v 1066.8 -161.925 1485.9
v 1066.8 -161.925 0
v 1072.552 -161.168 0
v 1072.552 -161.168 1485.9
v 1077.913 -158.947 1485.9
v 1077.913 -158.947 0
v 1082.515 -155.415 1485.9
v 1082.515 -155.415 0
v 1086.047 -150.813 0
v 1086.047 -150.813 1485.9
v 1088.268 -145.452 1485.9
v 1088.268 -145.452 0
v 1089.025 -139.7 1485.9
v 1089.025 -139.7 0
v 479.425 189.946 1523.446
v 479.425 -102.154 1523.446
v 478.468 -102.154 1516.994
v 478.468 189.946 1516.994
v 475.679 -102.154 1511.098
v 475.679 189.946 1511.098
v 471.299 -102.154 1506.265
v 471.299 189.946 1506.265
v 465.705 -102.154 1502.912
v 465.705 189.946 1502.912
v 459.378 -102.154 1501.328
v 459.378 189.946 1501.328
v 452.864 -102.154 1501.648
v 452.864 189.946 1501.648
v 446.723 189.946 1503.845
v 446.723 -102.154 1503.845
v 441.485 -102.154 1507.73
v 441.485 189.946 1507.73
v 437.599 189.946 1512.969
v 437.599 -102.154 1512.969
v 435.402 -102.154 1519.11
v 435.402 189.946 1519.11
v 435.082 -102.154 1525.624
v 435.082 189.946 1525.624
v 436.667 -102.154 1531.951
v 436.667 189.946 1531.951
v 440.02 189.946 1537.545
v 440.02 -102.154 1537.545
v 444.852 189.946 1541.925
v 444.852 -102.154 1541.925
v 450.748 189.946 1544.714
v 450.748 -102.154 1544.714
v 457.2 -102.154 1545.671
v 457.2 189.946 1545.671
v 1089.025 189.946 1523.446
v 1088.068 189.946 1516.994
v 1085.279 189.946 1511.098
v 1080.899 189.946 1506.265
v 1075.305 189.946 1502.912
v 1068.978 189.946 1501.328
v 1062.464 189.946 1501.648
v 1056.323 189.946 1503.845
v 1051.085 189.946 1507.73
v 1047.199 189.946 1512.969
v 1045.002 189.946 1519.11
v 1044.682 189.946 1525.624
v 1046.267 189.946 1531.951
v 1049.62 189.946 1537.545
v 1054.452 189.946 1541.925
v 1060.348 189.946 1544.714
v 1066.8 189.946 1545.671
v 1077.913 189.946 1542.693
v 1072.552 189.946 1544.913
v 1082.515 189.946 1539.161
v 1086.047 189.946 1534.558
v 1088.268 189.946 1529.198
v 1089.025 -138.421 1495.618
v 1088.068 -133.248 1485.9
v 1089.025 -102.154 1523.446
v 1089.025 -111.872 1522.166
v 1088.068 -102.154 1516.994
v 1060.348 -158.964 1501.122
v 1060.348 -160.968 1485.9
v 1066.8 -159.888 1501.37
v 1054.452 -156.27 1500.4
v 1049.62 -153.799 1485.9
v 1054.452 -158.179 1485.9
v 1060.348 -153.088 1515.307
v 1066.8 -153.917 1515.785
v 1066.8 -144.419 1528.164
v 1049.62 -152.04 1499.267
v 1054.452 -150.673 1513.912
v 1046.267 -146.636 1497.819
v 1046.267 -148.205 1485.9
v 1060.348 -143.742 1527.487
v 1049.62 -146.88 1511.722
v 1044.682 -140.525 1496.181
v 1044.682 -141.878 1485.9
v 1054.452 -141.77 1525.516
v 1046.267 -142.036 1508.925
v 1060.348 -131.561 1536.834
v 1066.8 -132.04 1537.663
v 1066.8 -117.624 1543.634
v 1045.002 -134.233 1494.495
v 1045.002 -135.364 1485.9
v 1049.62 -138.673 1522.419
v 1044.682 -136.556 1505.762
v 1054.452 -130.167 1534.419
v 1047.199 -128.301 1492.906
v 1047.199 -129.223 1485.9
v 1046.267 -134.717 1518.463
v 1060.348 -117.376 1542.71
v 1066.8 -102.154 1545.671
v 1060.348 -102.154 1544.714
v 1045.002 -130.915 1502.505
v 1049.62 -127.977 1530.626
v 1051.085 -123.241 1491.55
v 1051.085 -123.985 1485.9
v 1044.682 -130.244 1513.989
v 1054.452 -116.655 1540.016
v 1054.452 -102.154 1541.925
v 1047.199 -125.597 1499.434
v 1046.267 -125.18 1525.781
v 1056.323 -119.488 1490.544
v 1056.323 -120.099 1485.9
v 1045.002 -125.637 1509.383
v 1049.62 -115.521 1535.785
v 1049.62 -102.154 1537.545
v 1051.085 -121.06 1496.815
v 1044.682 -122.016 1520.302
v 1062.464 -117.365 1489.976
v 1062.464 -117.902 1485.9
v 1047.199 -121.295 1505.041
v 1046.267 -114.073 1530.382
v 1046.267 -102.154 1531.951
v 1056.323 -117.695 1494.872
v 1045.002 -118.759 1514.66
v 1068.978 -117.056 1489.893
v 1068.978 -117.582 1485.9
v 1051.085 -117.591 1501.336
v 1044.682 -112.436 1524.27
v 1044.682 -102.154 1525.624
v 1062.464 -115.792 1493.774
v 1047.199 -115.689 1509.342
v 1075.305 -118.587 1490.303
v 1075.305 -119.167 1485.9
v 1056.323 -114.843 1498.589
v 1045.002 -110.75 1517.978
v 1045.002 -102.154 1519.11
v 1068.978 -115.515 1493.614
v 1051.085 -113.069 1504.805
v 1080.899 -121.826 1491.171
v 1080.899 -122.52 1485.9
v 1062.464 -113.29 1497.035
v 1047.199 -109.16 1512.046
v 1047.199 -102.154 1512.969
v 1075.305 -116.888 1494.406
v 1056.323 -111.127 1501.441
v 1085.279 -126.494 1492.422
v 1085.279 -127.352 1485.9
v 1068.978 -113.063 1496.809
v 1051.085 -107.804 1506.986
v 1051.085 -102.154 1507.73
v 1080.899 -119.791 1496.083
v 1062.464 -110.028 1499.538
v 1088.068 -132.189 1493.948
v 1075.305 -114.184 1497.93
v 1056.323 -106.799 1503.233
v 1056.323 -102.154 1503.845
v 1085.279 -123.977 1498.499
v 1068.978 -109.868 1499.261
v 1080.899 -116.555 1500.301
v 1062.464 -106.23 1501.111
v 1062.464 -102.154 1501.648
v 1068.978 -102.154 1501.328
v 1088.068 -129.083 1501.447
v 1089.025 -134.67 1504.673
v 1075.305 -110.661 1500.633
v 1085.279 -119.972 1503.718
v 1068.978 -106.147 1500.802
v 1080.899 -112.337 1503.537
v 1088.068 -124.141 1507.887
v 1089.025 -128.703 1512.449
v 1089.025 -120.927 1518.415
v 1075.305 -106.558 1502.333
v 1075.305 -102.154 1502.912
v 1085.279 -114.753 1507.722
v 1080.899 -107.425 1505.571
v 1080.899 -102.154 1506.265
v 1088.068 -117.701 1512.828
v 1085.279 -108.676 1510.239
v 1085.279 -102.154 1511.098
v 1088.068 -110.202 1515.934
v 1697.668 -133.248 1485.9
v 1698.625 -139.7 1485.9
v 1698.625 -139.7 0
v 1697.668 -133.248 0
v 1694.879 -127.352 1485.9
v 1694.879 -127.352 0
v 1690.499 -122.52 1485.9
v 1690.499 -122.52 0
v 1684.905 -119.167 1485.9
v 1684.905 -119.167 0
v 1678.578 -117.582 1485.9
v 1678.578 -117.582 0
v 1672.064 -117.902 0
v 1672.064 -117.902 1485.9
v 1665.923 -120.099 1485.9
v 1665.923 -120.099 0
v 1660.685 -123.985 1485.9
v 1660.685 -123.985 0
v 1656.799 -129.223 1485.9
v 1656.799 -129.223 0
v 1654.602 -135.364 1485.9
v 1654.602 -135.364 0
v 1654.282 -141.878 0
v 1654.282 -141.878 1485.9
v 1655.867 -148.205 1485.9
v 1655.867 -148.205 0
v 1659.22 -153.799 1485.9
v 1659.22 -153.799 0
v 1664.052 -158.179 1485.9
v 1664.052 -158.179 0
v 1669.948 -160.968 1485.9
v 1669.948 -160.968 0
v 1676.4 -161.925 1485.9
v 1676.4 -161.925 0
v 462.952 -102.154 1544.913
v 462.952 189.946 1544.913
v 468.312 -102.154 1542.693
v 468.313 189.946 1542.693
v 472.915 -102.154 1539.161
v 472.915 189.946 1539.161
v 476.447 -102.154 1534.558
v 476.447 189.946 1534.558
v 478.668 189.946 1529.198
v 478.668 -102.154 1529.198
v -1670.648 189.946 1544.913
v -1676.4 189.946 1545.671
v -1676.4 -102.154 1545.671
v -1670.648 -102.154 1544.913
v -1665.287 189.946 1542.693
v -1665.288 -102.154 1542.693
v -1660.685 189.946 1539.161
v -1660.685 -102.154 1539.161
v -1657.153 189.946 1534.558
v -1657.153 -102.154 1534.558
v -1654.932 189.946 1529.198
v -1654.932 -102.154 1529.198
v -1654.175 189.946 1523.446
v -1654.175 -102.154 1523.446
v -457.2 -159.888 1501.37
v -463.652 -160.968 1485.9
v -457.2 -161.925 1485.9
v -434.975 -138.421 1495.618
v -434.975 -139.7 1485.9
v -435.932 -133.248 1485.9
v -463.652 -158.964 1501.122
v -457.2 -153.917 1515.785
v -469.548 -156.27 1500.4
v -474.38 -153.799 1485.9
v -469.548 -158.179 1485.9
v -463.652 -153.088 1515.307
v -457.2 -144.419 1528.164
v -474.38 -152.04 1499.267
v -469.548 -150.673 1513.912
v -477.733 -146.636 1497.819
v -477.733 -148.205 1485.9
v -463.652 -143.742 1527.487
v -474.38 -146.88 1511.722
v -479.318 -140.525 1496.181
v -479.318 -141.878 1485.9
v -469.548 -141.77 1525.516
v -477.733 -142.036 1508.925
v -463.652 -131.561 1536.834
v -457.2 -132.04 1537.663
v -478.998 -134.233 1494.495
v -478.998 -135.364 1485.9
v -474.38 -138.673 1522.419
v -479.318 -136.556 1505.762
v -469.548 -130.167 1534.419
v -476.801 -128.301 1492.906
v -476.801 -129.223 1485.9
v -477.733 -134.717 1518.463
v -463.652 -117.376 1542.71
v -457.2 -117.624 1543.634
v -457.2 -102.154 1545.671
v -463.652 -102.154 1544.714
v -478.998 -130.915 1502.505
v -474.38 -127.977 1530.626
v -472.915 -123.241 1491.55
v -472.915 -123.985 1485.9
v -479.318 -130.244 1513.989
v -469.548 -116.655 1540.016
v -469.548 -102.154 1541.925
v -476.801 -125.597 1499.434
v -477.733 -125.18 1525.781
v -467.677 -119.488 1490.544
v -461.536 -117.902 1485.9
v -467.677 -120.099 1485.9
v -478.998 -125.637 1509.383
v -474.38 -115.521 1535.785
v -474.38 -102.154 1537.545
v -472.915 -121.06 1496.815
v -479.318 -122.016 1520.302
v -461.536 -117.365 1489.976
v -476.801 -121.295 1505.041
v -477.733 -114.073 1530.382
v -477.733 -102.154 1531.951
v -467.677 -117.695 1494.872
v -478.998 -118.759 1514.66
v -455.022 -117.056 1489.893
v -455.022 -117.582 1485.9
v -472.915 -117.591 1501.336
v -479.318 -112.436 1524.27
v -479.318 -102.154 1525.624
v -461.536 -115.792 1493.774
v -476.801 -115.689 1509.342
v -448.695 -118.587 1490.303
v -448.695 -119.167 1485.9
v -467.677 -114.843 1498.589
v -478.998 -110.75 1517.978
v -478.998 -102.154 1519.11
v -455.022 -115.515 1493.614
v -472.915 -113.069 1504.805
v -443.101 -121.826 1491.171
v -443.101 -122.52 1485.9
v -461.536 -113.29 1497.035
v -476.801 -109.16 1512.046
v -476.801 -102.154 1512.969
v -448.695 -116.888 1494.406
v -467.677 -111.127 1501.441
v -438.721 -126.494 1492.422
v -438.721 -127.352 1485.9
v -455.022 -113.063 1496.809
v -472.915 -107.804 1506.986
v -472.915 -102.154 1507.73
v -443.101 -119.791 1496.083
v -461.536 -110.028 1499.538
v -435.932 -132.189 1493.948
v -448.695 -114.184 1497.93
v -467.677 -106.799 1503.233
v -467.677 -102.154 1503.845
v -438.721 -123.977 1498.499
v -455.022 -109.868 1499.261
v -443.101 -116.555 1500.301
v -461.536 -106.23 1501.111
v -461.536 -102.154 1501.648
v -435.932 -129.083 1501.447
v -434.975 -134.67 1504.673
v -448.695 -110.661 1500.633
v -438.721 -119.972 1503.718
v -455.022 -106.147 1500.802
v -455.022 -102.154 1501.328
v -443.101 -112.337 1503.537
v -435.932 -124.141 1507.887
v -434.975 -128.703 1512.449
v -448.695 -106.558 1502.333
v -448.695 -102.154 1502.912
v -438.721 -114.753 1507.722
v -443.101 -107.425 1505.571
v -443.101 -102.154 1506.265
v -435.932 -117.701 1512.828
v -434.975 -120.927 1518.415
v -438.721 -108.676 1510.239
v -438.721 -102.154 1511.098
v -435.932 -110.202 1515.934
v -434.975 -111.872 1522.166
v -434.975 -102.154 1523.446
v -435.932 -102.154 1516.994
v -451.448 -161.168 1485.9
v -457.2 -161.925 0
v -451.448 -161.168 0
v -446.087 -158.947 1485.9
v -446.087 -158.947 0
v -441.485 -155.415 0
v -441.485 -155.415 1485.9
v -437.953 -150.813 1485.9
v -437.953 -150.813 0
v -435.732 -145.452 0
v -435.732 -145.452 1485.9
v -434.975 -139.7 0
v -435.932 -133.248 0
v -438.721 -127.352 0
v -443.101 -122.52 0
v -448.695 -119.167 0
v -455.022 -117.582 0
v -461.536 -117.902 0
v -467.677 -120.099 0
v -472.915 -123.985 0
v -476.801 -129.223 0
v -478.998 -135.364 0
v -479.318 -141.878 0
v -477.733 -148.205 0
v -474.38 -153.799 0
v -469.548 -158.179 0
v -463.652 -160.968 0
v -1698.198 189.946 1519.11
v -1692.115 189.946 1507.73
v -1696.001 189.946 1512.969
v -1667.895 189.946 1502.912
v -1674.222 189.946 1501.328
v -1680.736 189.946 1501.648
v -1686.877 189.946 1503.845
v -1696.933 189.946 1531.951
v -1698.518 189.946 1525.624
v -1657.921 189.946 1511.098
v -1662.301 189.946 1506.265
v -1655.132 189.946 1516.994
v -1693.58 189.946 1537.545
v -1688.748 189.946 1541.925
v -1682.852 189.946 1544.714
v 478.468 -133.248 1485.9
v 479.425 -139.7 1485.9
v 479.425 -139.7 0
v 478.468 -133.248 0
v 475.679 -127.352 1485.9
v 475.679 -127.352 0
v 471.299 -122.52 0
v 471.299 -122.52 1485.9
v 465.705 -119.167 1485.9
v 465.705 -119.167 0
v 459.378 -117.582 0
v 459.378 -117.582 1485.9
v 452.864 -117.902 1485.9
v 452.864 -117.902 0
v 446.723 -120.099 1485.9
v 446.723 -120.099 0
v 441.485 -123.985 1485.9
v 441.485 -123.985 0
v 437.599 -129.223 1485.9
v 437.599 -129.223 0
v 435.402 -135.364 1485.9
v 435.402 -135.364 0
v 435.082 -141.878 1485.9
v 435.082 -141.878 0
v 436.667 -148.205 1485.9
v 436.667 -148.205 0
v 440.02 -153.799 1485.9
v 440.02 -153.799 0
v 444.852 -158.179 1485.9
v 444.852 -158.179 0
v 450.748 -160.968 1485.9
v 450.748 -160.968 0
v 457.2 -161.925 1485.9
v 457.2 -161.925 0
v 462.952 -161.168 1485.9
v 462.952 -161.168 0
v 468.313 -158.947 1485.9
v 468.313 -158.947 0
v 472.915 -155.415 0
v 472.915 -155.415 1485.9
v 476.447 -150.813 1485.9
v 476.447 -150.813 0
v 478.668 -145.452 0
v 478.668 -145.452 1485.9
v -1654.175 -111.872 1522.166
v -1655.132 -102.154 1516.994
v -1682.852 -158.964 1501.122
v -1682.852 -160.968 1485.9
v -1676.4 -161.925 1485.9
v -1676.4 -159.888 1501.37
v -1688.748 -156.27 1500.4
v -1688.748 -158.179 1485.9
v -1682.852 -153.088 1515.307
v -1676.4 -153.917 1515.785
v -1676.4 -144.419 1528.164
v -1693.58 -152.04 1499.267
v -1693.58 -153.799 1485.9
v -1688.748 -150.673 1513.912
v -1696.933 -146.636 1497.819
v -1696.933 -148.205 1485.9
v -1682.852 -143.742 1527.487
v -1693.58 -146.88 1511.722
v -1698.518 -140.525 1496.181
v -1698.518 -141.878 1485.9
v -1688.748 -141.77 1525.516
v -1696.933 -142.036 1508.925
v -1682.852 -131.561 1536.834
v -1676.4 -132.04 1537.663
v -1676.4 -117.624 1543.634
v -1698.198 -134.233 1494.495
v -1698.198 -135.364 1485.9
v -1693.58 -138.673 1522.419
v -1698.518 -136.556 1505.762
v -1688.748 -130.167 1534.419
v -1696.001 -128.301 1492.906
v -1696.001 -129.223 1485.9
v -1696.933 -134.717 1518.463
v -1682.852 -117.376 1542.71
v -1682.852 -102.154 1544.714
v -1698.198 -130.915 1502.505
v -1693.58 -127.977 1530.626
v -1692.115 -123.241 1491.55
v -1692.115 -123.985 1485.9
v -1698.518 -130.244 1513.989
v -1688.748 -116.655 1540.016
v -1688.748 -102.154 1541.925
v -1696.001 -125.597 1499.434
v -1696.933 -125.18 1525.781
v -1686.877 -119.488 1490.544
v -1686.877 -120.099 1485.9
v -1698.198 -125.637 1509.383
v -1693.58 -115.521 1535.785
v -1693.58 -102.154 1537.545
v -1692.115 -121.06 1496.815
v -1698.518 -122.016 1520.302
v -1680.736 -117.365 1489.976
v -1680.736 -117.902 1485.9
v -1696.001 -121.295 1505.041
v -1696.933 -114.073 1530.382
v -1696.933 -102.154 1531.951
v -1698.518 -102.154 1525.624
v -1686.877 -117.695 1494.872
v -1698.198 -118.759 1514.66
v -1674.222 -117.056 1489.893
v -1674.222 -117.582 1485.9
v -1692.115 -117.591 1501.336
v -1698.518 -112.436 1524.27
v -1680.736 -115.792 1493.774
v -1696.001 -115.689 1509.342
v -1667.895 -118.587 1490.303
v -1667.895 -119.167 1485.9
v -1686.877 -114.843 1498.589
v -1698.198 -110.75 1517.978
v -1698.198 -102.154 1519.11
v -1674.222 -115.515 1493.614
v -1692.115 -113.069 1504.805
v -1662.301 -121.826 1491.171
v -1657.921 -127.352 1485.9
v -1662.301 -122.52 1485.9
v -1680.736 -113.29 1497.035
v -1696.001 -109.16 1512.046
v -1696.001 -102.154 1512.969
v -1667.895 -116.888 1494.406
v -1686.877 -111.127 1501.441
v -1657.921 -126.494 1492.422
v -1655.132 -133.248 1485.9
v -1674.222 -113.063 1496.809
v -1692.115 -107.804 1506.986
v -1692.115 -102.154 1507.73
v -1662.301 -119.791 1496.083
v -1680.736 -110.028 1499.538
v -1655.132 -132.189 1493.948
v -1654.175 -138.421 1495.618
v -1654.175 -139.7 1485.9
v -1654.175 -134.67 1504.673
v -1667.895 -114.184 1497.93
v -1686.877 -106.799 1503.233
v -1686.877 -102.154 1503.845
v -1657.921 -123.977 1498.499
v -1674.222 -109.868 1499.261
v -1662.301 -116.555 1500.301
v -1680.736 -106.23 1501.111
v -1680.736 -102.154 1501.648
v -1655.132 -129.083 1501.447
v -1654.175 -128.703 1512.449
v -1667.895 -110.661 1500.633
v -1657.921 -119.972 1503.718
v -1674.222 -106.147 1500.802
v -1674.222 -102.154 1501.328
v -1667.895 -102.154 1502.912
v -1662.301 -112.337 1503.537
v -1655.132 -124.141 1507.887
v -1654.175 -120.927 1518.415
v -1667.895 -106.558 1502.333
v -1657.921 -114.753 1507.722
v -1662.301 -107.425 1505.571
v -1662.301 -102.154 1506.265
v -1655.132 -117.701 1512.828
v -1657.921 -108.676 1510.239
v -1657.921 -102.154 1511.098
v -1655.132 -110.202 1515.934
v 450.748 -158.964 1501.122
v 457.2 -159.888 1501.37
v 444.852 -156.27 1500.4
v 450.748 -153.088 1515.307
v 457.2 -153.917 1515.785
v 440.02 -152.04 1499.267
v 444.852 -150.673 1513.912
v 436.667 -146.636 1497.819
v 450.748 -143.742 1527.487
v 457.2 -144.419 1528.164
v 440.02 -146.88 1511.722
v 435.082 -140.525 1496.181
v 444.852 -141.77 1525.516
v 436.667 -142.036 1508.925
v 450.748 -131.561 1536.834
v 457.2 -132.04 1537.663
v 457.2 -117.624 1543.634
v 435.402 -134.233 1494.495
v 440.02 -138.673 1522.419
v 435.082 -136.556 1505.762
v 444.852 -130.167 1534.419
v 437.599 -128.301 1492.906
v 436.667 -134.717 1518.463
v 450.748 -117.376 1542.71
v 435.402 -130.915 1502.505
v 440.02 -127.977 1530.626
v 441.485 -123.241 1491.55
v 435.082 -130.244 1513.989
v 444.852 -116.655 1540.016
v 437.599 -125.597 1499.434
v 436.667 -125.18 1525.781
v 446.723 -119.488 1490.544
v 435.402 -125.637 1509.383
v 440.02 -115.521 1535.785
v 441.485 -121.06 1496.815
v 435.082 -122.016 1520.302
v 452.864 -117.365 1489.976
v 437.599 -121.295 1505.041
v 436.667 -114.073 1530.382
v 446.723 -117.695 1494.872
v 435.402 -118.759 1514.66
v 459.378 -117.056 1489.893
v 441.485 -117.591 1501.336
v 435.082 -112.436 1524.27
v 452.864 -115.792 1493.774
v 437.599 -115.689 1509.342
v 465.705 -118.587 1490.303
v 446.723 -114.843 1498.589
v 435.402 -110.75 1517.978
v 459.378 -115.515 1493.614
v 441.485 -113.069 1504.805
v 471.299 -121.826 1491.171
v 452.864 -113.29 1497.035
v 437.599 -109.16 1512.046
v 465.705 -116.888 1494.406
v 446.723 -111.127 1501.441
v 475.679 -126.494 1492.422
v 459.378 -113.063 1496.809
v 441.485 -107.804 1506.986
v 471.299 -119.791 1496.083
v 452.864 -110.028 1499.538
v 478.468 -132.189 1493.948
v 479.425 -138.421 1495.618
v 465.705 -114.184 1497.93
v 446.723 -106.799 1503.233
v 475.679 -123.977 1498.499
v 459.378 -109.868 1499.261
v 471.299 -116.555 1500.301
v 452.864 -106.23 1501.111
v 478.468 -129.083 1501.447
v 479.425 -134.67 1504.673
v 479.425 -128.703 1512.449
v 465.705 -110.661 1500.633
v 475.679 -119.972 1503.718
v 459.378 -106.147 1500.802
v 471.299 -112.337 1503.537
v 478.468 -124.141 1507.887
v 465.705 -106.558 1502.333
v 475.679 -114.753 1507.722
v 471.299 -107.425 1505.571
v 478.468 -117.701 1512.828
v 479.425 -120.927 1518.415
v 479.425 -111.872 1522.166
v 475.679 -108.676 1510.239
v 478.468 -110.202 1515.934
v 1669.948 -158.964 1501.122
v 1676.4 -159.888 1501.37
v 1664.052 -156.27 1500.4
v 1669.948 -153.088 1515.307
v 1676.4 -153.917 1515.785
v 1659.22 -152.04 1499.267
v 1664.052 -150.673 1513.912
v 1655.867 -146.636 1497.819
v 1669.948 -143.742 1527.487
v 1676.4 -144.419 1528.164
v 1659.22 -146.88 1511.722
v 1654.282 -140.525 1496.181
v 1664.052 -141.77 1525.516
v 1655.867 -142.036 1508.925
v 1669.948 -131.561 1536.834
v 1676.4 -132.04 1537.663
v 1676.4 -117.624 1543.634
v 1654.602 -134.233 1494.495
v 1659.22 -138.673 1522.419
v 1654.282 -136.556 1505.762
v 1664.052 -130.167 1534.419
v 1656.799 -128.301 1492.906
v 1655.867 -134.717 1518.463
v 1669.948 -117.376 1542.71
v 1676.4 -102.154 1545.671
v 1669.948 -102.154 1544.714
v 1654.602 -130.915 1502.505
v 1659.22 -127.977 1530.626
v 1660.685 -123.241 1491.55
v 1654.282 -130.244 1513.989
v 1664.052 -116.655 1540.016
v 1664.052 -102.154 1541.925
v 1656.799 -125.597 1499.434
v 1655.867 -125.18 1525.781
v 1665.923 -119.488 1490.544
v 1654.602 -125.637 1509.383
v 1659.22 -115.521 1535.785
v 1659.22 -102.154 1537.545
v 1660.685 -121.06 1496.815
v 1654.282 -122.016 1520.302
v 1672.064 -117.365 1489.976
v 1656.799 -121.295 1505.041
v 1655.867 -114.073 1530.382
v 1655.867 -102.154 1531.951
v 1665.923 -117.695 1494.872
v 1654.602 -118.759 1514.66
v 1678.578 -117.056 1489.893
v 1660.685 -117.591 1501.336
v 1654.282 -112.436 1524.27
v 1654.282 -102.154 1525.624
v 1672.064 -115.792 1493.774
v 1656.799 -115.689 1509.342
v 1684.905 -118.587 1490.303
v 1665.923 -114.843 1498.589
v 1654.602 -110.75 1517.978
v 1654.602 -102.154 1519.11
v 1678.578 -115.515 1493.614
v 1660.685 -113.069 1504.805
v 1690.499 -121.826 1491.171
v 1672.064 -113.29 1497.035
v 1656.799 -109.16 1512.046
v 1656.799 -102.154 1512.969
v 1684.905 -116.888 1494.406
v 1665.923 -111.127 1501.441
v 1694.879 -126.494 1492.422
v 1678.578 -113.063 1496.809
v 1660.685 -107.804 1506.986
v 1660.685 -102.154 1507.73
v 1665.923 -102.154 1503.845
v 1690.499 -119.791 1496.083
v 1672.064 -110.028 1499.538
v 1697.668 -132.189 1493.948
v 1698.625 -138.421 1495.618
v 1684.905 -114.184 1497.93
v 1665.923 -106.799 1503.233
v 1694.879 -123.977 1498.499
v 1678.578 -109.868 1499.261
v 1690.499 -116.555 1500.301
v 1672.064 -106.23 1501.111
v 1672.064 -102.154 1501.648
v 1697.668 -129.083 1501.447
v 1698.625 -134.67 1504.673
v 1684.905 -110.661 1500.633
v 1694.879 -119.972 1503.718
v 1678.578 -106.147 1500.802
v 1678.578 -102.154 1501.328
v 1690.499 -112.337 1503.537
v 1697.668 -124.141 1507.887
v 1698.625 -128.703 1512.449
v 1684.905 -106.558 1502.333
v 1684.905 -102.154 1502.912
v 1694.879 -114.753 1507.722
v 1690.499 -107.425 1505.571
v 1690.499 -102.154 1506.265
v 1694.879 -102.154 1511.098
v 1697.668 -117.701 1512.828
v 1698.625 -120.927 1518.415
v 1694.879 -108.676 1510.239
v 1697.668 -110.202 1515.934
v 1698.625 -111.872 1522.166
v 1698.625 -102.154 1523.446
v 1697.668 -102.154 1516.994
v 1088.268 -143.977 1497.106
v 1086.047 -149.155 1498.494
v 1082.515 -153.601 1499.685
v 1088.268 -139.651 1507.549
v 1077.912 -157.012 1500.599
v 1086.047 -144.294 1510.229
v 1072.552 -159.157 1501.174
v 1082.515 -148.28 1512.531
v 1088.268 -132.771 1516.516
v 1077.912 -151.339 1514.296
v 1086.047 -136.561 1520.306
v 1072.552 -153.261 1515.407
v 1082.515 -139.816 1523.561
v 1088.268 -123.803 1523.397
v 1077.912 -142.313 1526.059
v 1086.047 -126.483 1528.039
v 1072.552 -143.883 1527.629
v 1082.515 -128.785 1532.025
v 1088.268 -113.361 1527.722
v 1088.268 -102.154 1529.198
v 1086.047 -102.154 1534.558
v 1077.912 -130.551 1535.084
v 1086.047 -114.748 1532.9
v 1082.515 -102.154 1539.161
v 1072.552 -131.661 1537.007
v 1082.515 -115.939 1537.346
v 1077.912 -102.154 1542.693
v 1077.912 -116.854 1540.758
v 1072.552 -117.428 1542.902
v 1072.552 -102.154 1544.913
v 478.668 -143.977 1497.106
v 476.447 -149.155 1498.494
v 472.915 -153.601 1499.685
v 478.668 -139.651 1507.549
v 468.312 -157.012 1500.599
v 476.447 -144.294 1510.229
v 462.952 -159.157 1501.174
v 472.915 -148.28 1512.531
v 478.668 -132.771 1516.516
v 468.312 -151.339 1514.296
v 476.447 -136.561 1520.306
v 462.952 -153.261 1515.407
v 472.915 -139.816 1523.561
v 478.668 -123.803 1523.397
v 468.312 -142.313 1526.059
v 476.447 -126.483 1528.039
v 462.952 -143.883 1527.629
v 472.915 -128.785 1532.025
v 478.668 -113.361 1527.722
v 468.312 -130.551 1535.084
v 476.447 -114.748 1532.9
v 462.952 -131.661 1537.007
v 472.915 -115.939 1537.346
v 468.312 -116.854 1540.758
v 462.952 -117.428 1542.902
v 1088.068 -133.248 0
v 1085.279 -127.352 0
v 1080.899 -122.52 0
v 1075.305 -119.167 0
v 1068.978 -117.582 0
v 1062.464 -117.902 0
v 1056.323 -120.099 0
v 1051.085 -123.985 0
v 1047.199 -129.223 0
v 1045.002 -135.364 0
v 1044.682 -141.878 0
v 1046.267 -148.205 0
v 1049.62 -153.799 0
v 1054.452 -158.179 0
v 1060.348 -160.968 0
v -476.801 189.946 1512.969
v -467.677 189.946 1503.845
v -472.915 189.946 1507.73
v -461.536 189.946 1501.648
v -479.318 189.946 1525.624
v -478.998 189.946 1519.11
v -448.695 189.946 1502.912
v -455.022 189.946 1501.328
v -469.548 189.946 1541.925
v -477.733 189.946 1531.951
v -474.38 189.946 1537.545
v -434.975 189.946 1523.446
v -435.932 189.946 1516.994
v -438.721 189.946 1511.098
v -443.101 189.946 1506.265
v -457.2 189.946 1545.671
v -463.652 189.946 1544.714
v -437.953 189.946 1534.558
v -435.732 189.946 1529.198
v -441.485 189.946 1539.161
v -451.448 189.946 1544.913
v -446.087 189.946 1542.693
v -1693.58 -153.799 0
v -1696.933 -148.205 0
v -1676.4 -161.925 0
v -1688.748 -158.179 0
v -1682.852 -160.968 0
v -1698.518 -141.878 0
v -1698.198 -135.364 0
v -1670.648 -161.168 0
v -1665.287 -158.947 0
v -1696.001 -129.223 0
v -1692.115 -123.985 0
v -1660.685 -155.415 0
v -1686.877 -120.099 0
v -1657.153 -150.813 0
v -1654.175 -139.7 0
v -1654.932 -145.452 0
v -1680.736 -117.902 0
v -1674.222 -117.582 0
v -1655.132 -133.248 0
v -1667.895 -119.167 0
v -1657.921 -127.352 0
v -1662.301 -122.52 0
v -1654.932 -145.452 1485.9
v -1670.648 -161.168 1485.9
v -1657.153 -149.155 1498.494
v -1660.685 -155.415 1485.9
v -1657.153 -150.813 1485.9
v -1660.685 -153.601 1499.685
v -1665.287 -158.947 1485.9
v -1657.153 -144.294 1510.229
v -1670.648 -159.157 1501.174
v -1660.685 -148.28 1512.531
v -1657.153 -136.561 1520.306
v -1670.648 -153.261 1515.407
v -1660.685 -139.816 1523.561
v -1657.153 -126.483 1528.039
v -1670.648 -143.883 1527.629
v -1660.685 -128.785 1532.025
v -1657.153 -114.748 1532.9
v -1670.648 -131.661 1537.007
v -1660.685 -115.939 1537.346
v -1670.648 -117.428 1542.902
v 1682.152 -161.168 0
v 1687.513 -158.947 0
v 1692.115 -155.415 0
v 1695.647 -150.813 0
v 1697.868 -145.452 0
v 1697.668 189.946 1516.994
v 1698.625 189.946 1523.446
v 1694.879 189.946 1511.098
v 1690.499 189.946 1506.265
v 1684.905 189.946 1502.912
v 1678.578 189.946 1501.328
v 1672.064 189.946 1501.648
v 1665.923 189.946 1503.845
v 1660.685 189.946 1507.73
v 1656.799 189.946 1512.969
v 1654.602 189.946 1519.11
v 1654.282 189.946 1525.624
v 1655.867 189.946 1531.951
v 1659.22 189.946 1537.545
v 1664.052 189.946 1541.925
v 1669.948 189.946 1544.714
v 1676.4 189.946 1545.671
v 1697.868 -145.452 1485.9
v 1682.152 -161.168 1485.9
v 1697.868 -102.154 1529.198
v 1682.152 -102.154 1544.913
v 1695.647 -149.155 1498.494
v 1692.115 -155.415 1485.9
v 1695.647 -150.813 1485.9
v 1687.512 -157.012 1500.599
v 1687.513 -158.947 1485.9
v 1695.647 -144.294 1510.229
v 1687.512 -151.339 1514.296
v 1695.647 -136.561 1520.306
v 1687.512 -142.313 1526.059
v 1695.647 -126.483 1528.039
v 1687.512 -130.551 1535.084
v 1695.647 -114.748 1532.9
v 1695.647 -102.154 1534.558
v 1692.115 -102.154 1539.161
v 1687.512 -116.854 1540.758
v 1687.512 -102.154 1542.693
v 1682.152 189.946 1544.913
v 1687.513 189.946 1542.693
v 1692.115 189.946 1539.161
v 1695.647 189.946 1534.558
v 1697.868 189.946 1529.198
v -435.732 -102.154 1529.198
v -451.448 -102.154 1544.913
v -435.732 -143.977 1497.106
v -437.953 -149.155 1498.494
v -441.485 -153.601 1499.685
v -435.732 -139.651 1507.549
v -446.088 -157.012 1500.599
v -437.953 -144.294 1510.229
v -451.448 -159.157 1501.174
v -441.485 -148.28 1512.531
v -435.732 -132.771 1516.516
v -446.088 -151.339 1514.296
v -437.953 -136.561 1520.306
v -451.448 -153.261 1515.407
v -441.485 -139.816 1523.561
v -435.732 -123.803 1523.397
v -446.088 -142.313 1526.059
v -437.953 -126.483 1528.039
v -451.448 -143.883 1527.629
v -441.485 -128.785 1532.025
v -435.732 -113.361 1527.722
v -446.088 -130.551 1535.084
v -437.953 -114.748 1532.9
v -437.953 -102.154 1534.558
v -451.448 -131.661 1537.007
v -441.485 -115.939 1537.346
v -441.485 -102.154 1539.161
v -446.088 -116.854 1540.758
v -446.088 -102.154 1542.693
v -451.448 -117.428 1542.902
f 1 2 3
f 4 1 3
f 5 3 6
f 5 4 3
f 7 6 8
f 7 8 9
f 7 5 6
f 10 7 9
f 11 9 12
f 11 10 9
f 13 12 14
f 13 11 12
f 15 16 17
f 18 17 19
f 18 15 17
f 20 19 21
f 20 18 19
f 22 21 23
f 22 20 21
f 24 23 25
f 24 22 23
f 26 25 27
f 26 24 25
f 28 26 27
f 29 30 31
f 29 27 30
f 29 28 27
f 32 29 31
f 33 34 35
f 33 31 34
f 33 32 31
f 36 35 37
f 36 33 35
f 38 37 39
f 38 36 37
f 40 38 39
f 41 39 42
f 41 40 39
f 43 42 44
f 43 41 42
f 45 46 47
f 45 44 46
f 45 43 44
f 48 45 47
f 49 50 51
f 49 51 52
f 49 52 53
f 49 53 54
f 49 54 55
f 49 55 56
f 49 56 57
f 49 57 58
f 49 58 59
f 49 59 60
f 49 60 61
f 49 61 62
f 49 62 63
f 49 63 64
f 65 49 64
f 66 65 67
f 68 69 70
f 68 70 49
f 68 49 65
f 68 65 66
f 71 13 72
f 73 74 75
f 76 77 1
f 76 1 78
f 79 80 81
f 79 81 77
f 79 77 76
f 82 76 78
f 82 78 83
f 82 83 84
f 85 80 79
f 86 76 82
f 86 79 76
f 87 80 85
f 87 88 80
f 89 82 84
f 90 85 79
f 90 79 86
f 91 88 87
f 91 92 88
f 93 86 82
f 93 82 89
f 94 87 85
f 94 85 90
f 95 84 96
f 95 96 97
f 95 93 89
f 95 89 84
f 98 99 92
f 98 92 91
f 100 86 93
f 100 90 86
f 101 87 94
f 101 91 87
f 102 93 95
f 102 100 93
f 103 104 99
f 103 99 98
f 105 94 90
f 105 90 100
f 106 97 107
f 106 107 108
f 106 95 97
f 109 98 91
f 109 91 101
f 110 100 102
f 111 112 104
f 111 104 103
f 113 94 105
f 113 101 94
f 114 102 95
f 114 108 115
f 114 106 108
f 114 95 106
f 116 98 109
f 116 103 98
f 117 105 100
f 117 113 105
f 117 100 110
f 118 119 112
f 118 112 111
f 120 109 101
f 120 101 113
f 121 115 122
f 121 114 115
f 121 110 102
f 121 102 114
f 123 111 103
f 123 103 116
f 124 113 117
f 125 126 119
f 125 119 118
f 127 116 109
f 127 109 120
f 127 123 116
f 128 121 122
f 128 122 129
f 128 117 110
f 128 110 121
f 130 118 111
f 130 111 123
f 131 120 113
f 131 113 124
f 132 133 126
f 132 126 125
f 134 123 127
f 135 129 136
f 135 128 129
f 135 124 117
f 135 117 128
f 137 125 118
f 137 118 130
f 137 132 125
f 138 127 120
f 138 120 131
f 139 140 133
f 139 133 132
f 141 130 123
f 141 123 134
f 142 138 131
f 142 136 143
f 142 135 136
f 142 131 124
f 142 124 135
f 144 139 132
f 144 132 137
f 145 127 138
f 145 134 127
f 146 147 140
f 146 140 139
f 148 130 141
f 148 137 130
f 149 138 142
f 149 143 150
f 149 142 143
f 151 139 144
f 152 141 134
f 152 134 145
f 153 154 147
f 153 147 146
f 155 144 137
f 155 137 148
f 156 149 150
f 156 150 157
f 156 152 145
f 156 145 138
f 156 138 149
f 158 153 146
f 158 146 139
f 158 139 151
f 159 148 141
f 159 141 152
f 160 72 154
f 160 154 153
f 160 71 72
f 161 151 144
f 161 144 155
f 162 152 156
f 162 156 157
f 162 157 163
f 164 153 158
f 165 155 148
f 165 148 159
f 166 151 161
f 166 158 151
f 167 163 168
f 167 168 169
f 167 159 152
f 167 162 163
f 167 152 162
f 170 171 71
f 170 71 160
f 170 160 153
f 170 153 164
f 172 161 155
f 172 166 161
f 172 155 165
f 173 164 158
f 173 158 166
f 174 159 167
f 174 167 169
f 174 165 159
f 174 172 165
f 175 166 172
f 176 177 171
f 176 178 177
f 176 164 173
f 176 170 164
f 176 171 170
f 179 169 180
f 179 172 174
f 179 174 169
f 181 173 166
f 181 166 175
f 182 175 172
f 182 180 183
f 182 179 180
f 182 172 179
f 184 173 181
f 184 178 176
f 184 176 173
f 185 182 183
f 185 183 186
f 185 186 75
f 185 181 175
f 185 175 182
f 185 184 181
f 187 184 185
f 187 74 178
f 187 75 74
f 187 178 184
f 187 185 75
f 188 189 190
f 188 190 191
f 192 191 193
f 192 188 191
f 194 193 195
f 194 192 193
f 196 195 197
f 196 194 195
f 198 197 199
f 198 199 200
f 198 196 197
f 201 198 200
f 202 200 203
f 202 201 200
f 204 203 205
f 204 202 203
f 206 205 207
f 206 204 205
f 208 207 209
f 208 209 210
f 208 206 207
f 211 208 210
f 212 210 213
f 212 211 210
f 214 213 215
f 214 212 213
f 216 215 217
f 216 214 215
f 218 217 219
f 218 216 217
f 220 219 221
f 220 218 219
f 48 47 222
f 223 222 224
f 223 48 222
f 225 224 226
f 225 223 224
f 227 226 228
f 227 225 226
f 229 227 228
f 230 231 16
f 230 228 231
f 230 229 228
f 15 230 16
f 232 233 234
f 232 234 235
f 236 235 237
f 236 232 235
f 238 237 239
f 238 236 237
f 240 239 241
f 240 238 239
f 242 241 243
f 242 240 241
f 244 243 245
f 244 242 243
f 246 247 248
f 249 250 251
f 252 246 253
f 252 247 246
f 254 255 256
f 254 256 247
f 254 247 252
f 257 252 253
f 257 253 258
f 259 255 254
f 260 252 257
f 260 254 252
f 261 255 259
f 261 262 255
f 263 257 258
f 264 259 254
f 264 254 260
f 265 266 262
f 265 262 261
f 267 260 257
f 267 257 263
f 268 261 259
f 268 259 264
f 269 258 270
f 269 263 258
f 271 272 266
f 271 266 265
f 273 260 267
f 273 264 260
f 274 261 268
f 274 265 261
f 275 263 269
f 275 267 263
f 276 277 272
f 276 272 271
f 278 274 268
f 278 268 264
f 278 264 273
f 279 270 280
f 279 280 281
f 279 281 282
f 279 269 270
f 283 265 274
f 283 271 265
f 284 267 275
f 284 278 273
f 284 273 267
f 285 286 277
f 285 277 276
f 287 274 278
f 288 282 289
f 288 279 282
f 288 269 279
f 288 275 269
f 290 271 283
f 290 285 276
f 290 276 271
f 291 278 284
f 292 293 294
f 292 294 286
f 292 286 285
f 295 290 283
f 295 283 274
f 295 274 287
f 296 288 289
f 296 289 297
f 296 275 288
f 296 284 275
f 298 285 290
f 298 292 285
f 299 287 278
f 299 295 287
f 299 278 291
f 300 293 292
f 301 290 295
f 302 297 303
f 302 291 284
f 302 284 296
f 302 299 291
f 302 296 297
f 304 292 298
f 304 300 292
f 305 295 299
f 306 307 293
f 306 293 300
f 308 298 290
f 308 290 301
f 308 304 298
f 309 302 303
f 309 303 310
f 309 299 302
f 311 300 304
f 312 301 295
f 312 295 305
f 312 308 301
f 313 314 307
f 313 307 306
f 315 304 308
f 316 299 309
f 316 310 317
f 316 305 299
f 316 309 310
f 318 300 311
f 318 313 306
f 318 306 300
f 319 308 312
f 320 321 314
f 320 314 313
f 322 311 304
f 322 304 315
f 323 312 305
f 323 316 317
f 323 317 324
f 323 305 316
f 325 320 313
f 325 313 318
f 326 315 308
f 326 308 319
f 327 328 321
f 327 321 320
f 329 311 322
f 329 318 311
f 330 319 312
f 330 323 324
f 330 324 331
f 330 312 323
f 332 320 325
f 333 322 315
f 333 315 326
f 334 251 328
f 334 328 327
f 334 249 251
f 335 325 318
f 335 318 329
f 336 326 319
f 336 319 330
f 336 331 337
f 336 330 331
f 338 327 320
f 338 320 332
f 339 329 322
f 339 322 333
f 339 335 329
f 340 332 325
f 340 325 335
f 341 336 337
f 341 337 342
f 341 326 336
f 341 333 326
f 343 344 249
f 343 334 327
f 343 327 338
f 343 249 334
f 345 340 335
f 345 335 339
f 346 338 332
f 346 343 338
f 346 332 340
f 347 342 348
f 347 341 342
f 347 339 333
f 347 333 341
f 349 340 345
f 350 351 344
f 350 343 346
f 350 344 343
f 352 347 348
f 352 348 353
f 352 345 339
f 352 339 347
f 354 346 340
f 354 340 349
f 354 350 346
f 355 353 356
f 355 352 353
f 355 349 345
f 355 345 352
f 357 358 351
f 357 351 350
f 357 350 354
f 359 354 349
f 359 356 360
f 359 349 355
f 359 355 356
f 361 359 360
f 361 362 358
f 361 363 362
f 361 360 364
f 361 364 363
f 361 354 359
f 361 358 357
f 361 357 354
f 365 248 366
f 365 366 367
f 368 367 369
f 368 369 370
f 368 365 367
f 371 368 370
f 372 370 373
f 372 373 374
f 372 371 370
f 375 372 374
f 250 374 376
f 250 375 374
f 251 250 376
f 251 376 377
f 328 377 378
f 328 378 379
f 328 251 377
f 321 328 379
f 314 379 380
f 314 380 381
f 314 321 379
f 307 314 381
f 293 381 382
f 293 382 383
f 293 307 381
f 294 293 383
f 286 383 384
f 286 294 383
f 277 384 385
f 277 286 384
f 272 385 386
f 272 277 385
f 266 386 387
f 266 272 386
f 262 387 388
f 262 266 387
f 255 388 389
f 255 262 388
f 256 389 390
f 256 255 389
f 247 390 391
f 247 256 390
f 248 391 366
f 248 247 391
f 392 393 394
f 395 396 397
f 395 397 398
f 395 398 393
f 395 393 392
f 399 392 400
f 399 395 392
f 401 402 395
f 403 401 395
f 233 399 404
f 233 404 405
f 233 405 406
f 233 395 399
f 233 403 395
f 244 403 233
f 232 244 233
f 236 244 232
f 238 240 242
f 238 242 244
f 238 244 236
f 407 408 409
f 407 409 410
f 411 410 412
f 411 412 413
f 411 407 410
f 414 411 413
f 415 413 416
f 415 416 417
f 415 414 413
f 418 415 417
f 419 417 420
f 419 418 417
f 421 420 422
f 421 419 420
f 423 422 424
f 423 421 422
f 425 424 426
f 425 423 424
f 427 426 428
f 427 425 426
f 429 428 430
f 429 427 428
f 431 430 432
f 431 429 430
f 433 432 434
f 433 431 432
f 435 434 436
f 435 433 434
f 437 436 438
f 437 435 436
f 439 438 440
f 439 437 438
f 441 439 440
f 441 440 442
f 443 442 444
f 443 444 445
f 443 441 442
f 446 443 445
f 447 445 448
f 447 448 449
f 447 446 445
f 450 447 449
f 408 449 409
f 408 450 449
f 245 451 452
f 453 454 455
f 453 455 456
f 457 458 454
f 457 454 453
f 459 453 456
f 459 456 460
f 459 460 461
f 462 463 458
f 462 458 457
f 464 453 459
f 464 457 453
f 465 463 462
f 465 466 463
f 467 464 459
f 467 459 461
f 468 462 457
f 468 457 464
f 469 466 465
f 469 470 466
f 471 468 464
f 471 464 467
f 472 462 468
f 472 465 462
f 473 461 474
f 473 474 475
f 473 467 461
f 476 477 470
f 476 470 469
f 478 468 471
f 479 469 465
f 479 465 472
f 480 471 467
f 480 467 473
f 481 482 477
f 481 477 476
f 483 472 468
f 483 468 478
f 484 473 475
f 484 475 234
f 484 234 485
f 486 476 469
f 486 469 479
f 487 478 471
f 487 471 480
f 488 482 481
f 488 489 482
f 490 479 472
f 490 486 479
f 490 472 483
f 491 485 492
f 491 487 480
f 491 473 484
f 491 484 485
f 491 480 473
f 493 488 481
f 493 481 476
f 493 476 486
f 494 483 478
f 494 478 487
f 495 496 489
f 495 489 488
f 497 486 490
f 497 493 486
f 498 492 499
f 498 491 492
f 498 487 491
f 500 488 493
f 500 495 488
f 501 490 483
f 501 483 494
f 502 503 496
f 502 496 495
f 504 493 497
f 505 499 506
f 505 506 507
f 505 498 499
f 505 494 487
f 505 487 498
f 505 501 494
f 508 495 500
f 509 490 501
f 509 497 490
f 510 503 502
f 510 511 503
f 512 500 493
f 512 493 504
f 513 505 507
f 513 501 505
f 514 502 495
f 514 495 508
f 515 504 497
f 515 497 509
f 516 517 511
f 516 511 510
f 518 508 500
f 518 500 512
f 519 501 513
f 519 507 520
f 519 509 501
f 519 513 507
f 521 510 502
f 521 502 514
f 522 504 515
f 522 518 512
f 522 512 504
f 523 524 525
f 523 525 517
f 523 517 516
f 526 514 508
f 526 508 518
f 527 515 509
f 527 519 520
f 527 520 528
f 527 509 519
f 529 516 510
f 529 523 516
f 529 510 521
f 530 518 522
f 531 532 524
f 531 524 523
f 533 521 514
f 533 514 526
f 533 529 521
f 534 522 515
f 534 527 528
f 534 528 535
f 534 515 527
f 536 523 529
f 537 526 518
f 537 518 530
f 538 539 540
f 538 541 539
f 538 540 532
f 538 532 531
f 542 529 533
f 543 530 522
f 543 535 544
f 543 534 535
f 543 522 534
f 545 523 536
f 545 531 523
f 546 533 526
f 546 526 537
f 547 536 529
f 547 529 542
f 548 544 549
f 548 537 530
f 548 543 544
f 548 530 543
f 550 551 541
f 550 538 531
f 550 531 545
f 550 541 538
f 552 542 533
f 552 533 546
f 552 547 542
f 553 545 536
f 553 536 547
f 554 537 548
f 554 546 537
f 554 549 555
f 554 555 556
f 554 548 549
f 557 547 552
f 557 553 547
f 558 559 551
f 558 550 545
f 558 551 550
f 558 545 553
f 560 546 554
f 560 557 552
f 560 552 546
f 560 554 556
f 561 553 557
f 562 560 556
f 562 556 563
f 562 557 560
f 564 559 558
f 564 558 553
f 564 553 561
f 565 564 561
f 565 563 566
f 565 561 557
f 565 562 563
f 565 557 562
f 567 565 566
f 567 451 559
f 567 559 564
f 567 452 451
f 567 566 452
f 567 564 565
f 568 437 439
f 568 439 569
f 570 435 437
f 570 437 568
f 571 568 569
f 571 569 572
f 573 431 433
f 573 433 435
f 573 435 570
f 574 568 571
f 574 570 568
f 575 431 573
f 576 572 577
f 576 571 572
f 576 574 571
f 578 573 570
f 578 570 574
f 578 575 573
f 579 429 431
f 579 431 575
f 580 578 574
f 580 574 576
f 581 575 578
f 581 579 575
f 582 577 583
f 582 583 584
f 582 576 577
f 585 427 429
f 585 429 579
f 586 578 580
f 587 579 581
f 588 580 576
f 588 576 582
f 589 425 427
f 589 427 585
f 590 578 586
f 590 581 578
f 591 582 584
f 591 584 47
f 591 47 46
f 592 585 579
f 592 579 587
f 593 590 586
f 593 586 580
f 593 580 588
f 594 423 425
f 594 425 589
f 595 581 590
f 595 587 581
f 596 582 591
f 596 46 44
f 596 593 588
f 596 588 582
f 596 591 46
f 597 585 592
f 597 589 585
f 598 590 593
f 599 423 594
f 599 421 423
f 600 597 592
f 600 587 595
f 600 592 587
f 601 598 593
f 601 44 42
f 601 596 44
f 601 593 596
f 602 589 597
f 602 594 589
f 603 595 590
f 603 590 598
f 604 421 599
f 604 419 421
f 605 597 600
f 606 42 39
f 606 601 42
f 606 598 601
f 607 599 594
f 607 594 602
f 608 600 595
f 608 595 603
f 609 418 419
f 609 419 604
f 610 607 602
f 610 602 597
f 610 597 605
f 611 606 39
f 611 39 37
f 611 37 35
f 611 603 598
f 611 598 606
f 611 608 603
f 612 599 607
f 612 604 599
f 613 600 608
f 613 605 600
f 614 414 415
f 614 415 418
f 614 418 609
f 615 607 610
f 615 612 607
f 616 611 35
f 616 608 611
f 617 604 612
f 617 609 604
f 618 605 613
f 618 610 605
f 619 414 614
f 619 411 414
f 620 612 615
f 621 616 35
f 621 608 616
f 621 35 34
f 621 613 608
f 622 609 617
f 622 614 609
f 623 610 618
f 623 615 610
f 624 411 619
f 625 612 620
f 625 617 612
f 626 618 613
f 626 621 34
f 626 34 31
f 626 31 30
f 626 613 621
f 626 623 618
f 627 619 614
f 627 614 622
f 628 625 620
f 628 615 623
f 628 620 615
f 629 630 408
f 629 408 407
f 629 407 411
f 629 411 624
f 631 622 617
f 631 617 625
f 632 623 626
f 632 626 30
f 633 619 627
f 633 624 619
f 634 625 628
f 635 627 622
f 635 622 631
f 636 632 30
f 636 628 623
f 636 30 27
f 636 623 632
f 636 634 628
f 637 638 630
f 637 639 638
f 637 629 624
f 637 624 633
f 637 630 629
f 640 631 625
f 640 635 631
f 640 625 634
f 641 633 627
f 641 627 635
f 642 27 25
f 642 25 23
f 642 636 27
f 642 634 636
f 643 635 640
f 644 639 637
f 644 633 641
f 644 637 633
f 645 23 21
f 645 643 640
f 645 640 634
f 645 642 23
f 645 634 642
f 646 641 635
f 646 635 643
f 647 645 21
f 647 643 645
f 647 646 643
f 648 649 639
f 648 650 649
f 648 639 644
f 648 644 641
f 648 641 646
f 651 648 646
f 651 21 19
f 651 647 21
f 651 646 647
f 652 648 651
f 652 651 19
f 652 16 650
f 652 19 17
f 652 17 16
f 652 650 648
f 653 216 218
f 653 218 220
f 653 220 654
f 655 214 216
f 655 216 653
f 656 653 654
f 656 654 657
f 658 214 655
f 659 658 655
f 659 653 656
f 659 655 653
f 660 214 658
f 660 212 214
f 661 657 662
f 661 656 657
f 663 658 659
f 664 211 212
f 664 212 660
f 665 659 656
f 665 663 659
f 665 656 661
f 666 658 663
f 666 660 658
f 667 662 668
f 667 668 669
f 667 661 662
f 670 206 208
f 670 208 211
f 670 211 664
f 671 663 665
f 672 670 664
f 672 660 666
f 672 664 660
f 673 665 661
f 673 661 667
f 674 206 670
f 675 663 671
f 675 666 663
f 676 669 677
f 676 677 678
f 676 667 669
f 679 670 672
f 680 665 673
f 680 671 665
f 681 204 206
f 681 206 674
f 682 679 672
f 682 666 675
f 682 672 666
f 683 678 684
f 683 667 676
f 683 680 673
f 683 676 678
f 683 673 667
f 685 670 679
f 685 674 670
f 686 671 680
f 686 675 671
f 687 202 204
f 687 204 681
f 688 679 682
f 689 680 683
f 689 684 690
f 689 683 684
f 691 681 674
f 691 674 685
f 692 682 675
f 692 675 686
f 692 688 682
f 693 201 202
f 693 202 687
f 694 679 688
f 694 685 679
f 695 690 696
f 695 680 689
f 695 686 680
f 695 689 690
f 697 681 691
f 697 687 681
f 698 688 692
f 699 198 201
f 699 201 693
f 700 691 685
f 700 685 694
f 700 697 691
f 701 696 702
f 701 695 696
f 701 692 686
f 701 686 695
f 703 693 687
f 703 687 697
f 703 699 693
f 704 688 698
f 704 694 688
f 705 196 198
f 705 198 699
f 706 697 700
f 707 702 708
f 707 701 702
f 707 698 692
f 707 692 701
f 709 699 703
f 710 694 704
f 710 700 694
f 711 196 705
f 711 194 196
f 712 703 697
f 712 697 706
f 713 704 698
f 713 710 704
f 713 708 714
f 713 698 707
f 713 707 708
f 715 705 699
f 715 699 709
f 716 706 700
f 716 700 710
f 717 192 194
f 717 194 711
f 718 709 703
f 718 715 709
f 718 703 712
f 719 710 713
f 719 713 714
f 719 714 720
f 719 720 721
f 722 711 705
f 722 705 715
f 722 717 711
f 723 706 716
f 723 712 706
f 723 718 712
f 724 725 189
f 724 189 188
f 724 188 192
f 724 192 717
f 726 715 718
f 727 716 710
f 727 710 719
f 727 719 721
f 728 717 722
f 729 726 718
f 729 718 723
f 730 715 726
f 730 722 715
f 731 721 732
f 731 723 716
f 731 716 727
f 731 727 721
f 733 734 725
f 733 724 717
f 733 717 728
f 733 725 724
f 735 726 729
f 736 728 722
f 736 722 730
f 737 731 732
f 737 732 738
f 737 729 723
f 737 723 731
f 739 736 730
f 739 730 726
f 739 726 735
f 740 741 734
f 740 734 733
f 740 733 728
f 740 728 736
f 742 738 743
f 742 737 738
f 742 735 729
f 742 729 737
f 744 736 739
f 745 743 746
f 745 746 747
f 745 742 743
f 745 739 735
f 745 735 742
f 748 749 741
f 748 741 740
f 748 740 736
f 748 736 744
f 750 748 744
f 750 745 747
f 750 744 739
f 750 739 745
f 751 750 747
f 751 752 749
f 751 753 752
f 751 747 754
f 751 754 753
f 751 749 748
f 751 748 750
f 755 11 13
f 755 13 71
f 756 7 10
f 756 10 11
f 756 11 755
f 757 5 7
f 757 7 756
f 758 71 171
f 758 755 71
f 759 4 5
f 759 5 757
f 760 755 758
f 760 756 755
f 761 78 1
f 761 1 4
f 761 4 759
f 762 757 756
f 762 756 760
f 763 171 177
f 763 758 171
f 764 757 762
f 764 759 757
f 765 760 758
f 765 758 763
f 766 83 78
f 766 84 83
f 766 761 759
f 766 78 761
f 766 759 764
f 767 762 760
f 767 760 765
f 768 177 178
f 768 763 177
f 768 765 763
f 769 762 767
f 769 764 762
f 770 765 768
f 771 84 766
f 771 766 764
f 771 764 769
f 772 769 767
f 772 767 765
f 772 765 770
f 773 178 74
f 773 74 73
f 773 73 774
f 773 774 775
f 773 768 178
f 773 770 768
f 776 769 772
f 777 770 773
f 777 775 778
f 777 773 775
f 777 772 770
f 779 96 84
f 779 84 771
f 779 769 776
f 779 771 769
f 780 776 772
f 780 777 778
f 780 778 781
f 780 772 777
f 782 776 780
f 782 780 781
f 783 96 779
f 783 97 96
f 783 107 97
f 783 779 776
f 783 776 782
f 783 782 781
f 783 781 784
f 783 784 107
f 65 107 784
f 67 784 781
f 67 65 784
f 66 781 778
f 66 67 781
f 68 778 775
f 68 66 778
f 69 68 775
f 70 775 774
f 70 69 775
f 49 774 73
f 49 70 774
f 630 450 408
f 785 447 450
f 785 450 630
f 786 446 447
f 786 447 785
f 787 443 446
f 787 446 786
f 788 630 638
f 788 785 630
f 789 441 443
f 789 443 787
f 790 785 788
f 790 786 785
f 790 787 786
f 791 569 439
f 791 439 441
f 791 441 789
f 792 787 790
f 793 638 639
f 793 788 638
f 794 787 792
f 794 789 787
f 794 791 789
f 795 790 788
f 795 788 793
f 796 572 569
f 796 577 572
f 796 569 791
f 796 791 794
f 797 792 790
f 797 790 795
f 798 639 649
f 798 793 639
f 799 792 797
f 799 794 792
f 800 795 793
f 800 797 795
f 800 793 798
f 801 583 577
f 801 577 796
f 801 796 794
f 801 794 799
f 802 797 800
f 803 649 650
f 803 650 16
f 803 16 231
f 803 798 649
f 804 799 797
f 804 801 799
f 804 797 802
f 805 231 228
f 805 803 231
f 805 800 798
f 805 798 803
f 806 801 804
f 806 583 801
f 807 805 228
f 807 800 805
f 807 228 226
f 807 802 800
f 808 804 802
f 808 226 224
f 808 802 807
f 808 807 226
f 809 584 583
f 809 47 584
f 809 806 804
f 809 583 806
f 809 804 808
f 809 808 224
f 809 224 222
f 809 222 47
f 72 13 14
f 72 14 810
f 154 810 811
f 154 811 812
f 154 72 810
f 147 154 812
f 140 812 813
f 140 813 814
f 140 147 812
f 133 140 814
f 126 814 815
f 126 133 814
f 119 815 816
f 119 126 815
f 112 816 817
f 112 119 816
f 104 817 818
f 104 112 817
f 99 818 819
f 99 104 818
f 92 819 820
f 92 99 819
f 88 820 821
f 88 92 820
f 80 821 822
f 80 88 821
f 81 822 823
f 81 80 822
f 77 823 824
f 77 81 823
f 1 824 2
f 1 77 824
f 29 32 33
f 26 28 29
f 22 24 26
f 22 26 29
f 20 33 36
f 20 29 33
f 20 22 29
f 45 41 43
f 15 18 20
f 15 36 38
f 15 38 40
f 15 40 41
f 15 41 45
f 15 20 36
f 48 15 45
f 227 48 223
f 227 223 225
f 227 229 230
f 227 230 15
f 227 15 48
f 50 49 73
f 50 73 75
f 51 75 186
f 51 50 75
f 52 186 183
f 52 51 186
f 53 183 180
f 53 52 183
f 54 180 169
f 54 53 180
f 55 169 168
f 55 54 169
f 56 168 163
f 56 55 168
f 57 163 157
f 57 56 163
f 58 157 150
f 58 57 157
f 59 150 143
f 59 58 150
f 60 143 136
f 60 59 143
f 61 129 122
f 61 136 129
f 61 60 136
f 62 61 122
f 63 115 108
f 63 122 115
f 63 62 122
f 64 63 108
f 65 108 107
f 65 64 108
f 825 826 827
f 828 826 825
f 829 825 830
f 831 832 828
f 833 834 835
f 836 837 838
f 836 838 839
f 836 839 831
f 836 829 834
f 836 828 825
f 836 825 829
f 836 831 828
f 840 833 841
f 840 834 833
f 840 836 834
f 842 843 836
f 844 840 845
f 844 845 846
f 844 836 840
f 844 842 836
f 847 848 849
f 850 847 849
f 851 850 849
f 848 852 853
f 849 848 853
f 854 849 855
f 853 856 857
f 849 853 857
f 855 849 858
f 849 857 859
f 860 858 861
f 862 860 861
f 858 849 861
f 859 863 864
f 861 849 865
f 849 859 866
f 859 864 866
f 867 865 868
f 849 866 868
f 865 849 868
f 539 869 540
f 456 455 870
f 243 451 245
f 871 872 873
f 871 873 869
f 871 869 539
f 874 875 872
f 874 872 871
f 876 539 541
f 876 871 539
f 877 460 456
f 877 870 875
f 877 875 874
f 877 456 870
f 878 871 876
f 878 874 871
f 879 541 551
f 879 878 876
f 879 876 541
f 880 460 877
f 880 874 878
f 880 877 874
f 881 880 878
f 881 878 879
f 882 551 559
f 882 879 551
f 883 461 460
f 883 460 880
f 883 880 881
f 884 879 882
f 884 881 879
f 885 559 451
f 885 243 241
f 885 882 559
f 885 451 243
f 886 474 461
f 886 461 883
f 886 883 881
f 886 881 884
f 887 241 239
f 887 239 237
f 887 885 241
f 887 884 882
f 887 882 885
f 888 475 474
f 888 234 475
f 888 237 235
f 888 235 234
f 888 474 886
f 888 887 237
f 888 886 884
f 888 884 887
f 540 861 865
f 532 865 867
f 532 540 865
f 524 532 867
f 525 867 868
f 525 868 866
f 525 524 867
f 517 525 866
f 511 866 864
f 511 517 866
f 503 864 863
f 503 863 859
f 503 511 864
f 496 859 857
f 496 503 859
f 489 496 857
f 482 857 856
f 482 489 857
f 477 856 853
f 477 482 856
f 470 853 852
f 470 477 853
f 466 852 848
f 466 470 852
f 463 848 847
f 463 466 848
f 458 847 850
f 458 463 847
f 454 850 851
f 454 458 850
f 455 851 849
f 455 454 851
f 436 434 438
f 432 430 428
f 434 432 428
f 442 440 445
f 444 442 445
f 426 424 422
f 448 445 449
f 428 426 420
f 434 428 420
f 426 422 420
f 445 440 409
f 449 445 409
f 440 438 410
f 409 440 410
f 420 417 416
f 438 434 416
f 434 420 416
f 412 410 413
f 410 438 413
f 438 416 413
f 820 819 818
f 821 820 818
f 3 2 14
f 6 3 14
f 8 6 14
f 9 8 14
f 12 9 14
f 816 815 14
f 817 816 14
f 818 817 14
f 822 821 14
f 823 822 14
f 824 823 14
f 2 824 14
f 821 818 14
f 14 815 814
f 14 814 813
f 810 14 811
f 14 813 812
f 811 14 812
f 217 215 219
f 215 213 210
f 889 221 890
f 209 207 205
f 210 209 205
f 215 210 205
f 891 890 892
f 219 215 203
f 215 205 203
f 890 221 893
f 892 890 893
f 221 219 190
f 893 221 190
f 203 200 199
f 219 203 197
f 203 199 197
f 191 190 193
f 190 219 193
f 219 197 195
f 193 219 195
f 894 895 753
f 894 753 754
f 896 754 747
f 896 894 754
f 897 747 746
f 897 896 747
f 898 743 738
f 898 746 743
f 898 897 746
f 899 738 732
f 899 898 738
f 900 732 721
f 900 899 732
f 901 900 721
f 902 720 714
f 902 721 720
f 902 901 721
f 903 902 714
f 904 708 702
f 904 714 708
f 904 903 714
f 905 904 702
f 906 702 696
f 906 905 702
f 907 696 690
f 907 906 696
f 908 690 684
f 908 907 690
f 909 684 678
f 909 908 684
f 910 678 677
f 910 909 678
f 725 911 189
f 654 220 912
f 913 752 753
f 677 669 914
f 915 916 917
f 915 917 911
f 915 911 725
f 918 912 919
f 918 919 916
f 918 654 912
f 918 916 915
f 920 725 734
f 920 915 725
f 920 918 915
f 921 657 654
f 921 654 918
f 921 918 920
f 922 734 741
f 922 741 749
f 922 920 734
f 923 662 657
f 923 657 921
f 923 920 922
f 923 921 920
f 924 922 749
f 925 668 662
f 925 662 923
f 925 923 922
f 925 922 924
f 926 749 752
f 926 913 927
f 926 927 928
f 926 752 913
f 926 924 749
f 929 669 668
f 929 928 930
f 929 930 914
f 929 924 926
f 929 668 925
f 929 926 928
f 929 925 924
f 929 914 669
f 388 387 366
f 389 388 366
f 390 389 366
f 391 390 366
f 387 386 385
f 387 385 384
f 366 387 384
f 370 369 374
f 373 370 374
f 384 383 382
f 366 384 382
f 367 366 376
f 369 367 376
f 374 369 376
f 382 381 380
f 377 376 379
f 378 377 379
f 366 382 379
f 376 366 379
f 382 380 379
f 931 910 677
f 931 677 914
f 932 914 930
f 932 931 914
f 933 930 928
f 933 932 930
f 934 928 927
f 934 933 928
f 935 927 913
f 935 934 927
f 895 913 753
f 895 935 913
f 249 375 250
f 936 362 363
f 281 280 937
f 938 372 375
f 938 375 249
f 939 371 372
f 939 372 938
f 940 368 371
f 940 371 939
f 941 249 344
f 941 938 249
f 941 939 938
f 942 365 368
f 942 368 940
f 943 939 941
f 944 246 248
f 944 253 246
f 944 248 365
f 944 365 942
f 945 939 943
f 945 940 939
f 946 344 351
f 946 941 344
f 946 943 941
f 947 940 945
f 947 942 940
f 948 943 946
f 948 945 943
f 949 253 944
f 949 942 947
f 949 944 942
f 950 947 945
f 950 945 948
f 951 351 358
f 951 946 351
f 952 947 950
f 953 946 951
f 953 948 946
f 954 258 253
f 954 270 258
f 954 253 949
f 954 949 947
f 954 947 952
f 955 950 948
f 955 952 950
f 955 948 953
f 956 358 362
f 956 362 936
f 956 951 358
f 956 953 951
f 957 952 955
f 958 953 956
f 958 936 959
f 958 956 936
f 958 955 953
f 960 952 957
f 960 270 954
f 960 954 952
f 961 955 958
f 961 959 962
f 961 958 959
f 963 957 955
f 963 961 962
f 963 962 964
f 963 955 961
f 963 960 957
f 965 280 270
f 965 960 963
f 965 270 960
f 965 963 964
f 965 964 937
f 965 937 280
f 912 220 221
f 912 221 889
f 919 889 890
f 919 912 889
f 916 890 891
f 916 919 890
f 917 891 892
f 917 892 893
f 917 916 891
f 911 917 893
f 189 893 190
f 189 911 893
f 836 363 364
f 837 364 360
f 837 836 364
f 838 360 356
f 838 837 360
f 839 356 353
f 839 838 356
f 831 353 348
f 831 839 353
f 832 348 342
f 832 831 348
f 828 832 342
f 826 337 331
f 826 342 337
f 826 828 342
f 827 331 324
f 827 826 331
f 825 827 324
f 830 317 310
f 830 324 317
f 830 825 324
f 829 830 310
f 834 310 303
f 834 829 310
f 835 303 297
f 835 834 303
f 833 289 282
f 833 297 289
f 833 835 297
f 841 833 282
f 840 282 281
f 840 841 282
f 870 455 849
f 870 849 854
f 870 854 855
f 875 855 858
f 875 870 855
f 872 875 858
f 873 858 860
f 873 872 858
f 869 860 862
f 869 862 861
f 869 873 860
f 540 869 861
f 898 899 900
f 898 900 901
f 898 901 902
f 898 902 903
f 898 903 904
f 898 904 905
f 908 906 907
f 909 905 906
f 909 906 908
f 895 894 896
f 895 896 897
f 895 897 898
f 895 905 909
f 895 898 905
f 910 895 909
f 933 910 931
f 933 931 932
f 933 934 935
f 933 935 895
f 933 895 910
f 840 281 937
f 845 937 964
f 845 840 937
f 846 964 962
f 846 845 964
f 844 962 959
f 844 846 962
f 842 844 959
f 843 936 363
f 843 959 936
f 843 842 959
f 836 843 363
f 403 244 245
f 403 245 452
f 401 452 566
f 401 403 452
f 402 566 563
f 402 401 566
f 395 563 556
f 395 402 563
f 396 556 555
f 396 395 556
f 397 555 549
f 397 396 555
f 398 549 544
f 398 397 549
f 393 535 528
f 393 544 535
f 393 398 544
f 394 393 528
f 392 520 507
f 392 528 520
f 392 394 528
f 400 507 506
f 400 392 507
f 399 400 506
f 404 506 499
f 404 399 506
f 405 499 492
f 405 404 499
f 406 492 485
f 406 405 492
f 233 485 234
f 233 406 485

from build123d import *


with BuildPart() as f19:
    # F19: sweep along a path in F18
    with BuildLine(Plane.YZ.offset(-1676.4)) as f19_path:
        Line((-140.2544249311, 0), (-140.2544249311, 1485.9))
        ThreePointArc((-140.2544249311, 1485.9), (-129.0951932944, 1512.8407683632), (-102.1544249311, 1524))
        Line((-102.1544249311, 1524), (189.9455750689, 1524))
    # F7 (on Top) → F19 (sweep)
    with BuildSketch(Plane.XY):
        with BuildLine():
            ThreePointArc((1676.4, -161.925), (1692.1154482119, -155.4154482119), (1698.625, -139.7))
            ThreePointArc((1698.625, -139.7), (1660.6845517881, -123.9845517881), (1676.4, -161.925))
        make_face()
        with BuildLine():
            ThreePointArc((1066.8, -161.925), (1082.5154482119, -155.4154482119), (1089.025, -139.7))
            ThreePointArc((1089.025, -139.7), (1051.0845517881, -123.9845517881), (1066.8, -161.925))
        make_face()
        with BuildLine():
            ThreePointArc((457.2, -161.925), (472.9154482119, -155.4154482119), (479.425, -139.7))
            ThreePointArc((479.425, -139.7), (441.4845517881, -123.9845517881), (457.2, -161.925))
        make_face()
        with BuildLine():
            ThreePointArc((-457.2, -161.925), (-441.4845517881, -155.4154482119), (-434.975, -139.7))
            ThreePointArc((-434.975, -139.7), (-472.9154482119, -123.9845517881), (-457.2, -161.925))
        make_face()
        with BuildLine():
            ThreePointArc((-1676.4, -161.925), (-1660.6845517881, -155.4154482119), (-1654.175, -139.7))
            ThreePointArc((-1654.175, -139.7), (-1692.1154482119, -123.9845517881), (-1676.4, -161.925))
        make_face()
    sweep(path=f19_path.line)


solid = f19.part
